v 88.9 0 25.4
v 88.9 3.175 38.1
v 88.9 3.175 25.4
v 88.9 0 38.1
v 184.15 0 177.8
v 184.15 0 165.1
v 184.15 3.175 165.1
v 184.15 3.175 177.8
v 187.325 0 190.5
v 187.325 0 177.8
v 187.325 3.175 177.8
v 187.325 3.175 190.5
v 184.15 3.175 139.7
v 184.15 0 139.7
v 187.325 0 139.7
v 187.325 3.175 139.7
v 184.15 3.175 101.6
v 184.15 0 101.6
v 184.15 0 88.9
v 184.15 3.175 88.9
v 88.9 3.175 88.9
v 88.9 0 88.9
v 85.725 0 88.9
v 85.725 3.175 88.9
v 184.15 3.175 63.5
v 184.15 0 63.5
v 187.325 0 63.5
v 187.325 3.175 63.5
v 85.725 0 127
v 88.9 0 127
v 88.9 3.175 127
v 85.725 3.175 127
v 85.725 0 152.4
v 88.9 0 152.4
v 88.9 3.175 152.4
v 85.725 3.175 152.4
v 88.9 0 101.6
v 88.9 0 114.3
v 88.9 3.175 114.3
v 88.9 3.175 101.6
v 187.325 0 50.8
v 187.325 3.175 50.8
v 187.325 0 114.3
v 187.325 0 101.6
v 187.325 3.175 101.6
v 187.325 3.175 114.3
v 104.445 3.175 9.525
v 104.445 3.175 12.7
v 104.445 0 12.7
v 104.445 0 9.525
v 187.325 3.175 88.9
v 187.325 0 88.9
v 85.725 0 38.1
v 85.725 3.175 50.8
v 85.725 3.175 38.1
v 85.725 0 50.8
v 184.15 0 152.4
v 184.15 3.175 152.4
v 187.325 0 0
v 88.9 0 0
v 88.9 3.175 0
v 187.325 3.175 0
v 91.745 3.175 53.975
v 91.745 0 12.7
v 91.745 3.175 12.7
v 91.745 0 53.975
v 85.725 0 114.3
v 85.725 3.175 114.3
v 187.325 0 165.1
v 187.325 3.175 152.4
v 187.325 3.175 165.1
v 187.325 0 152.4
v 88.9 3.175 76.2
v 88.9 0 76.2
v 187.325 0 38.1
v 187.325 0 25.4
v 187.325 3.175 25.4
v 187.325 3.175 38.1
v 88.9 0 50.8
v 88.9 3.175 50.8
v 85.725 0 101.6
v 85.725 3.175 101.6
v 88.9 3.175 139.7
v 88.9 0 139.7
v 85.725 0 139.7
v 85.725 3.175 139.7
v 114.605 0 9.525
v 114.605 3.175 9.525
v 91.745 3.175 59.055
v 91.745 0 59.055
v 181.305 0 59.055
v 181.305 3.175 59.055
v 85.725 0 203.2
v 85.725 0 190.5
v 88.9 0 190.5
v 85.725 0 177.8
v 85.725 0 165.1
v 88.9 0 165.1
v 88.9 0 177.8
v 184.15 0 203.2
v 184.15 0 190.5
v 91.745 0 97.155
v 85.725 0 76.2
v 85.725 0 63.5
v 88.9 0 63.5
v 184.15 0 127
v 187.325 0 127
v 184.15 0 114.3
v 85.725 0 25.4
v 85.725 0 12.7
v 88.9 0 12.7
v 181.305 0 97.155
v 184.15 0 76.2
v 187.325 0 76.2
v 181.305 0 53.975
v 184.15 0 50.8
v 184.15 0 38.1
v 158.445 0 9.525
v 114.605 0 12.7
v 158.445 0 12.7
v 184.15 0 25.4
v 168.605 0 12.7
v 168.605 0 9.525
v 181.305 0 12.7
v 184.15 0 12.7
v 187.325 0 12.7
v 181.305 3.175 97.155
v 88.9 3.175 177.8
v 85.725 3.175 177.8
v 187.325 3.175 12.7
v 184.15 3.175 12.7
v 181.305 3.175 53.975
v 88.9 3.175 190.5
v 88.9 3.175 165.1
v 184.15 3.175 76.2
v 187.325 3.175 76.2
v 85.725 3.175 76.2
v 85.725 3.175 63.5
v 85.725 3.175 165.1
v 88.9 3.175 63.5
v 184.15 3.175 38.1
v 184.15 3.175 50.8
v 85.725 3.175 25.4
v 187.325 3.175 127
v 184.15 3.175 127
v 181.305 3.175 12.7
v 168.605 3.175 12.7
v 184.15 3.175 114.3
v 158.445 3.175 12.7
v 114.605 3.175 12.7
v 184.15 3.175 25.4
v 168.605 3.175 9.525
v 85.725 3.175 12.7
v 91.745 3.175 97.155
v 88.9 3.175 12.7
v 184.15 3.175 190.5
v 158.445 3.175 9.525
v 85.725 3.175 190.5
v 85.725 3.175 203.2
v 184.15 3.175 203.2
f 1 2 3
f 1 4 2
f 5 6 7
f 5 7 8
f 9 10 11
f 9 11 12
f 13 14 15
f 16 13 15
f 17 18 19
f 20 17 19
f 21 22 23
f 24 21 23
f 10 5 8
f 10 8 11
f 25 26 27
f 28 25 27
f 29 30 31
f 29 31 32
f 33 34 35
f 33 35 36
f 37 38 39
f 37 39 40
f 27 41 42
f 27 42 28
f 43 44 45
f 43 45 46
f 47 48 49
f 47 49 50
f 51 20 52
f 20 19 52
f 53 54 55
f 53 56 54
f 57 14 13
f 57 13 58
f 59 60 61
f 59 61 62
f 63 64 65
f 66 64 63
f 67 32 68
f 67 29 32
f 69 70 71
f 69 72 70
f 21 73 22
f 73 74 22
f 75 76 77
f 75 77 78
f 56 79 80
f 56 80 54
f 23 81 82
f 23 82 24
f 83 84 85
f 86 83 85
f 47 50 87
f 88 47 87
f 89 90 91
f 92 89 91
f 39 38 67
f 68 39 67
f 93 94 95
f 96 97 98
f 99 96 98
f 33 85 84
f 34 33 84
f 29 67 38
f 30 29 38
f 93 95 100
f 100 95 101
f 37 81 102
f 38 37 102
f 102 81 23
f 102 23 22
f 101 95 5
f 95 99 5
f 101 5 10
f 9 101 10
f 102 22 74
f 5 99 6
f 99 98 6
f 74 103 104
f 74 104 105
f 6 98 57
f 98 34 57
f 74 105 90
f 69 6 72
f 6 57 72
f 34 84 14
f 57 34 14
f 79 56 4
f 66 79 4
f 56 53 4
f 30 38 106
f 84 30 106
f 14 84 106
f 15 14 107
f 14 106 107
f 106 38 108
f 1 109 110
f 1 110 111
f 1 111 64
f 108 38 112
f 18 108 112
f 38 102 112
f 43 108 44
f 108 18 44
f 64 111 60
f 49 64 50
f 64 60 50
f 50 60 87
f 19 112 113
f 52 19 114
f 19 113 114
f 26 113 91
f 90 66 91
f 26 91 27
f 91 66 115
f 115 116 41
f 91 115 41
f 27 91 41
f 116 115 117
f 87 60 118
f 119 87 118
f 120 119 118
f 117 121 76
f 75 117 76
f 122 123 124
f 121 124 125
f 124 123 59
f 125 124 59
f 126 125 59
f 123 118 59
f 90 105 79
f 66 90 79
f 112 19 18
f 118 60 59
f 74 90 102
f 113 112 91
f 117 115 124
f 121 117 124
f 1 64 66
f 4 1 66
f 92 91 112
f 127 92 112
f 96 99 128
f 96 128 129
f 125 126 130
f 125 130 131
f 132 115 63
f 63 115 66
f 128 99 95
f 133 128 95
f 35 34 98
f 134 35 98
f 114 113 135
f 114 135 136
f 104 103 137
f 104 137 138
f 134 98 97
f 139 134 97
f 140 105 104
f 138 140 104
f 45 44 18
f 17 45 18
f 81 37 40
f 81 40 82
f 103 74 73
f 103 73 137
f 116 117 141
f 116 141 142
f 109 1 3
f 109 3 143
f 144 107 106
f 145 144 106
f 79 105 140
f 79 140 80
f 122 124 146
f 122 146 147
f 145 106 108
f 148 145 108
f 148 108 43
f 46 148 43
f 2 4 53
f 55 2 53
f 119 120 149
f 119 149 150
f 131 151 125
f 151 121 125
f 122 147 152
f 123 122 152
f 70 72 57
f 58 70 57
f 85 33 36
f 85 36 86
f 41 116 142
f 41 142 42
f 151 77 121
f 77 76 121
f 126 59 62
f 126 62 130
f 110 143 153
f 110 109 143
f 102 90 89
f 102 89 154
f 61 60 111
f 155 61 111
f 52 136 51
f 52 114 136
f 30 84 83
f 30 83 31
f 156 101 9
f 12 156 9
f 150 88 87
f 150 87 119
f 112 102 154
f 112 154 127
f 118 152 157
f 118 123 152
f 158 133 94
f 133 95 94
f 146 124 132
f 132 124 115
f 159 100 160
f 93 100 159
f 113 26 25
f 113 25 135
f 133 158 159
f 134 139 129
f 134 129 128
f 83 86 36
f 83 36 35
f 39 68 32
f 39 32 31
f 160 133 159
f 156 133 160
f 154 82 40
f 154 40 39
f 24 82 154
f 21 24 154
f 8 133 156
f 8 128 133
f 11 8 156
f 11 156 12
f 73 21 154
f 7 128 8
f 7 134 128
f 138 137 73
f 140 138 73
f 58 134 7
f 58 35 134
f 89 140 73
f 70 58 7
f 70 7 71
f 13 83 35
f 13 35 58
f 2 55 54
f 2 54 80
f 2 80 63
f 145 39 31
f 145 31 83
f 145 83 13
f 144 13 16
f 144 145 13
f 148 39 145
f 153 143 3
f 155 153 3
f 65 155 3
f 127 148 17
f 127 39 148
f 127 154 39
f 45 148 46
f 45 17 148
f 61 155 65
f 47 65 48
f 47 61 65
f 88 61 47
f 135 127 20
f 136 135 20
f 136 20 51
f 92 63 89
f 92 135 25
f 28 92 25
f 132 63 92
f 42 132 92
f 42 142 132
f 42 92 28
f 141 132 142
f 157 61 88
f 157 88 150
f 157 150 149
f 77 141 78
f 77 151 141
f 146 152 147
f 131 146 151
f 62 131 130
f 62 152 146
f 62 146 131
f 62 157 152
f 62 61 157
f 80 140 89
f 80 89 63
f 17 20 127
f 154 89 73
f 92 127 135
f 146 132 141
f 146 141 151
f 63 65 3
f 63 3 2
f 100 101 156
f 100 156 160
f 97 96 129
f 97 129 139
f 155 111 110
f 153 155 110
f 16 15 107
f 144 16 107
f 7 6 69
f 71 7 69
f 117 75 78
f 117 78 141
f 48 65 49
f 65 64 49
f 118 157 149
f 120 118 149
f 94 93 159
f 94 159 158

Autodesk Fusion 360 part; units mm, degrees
sketch "Sketch2" plane through (0, 0, 0) normal (0, 0, 1) x (1, 0, 0)
sketch "Sketch3" plane through (0, 0, 0) normal (0, 1, 0) x (1, 0, 0)
  line L0 (85.725, 0) -> (101.6, 0)
  line L1 (88.9, -50.8) -> (85.725, -50.8)
  line L2 (187.325, -12.7) -> (184.15, -12.7)
  line L3 (104.4448, -12.7) -> (104.4448, -9.525)
  line L4 (88.9, -12.7) -> (85.725, -12.7)
  line L5 (85.725, -25.4) -> (85.725, -12.7)
  line L6 (91.7448, -12.7) -> (104.4448, -12.7)
  line L7 (88.9, -63.5) -> (88.9, -50.8)
  line L8 (181.3052, -12.7) -> (168.6052, -12.7)
  line L9 (88.9, -76.2) -> (88.9, -63.5)
  line L10 (181.3052, -53.975) -> (91.7448, -53.975)
  line L11 (85.725, 0) -> (87.3125, 0)
  line L12 (91.7448, 0) -> (91.7448, -12.7)
  line L13 (88.9, -50.8) -> (88.9, -38.1)
  line L14 (88.9, -25.4) -> (88.9, -12.7)
  line L15 (176.2252, 0) -> (181.3052, 0)
  line L16 (187.325, -38.1) -> (184.15, -38.1)
  line L17 (158.4452, -12.7) -> (156.5402, -12.7)
  line L18 (96.8248, -12.7) -> (104.4448, -12.7)
  line L19 (168.6052, -12.7) -> (176.2252, -12.7)
  line L20 (91.7448, -12.7) -> (96.8248, -12.7)
  line L21 (88.9, -38.1) -> (88.9, -25.4)
  line L22 (168.6052, -12.7) -> (168.6052, -9.525)
  line L23 (96.8248, 0) -> (91.7448, 0)
  line L24 (187.325, -25.4) -> (184.15, -25.4)
  line L25 (88.9, -25.4) -> (85.725, -25.4)
  line L26 (114.6048, -12.7) -> (156.5402, -12.7)
  line L27 (158.4452, -9.525) -> (158.4452, -12.7)
  line L28 (114.6048, -9.525) -> (114.6048, -12.7)
  line L29 (187.325, 0) -> (187.325, -12.7)
  line L30 (181.3052, -12.7) -> (176.2252, -12.7)
  line L31 (187.325, 0) -> (184.15, 0)
  line L32 (85.725, 0) -> (96.8248, 0)
  line L33 (187.325, 0) -> (176.2252, 0)
  line L34 (184.15, -12.7) -> (184.15, 0)
  line L35 (184.15, -25.4) -> (184.15, -12.7)
  line L36 (88.9, -139.7) -> (85.725, -139.7)
  line L37 (88.9, -101.6) -> (88.9, -95.25)
  line L38 (88.9, -127) -> (85.725, -127)
  line L39 (88.9, -95.25) -> (88.9, -88.9)
  line L40 (184.15, -101.6) -> (184.15, -88.9)
  line L41 (88.9, -114.3) -> (88.9, -101.6)
  line L42 (187.325, -101.6) -> (187.325, -114.3)
  line L43 (184.15, -127) -> (184.15, -114.3)
  line L44 (88.9, -127) -> (88.9, -114.3)
  line L45 (187.325, -101.6) -> (184.15, -101.6)
  line L46 (187.325, -139.7) -> (187.325, -127)
  line L47 (184.15, -139.7) -> (187.325, -139.7)
  line L48 (88.9, -114.3) -> (85.725, -114.3)
  line L49 (88.9, -139.7) -> (88.9, -127)
  line L50 (187.325, -114.3) -> (187.325, -101.6)
  line L51 (187.325, -127) -> (184.15, -127)
  line L52 (88.9, -88.9) -> (85.725, -88.9)
  line L53 (91.7448, -97.155) -> (181.3052, -97.155)
  line L54 (85.725, -101.6) -> (85.725, -88.9)
  line L55 (88.9, -101.6) -> (85.725, -101.6)
  line L56 (187.325, -127) -> (187.325, -139.7)
  line L57 (184.15, -88.9) -> (187.325, -88.9)
  line L58 (184.15, -114.3) -> (187.325, -114.3)
  line L59 (85.725, -127) -> (85.725, -114.3)
  line L60 (184.15, 0) -> (184.15, -203.2)
  line L61 (85.725, -203.2) -> (88.9, -203.2)
  line L62 (88.9, 0) -> (88.9, -203.2)
  line L63 (88.9, -165.1) -> (88.9, -152.4)
  line L64 (187.325, -152.4) -> (187.325, -165.1)
  line L65 (184.15, -203.2) -> (184.15, -190.5)
  line L66 (184.15, -152.4) -> (184.15, -139.7)
  line L67 (88.9, -203.2) -> (88.9, -190.5)
  line L68 (85.725, -152.4) -> (85.725, -139.7)
  line L69 (88.9, -165.1) -> (85.725, -165.1)
  line L70 (88.9, -190.5) -> (85.725, -190.5)
  line L71 (88.9, -177.8) -> (85.725, -177.8)
  line L72 (184.15, -177.8) -> (187.325, -177.8)
  line L73 (184.15, -190.5) -> (184.15, -177.8)
  line L74 (88.9, -152.4) -> (88.9, -139.7)
  line L75 (184.15, -165.1) -> (187.325, -165.1)
  line L76 (187.325, -177.8) -> (187.325, -190.5)
  line L77 (88.9, -152.4) -> (85.725, -152.4)
  line L78 (187.325, -152.4) -> (184.15, -152.4)
  line L79 (184.15, -190.5) -> (187.325, -190.5)
  line L80 (184.15, -76.2) -> (187.325, -76.2)
  line L81 (181.3052, 0) -> (181.3052, -12.7)
  line L82 (91.7448, -59.055) -> (181.3052, -59.055)
  line L83 (187.325, -165.1) -> (187.325, -152.4)
  line L84 (91.7448, -59.055) -> (91.7448, -97.155)
  line L85 (88.9, -63.5) -> (85.725, -63.5)
  line L86 (184.15, -177.8) -> (184.15, -165.1)
  line L87 (184.15, -50.8) -> (184.15, -38.1)
  line L88 (85.725, 0) -> (187.325, 0)
  line L89 (184.15, -63.5) -> (187.325, -63.5)
  line L90 (187.325, -25.4) -> (187.325, -38.1)
  line L91 (187.325, 0) -> (175.26, 0)
  line L92 (184.15, -76.2) -> (184.15, -63.5)
  line L93 (181.3052, -59.055) -> (181.3052, -97.155)
  line L94 (187.325, -50.8) -> (187.325, -63.5)
  line L95 (168.6052, -9.525) -> (158.4452, -9.525)
  line L96 (184.15, -38.1) -> (184.15, -25.4)
  line L97 (85.725, -76.2) -> (85.725, -63.5)
  line L98 (85.725, -177.8) -> (85.725, -165.1)
  line L99 (91.7448, -12.7) -> (91.7448, -53.975)
  line L100 (85.725, -50.8) -> (85.725, -38.1)
  line L101 (104.4448, -9.525) -> (114.6048, -9.525)
  line L102 (184.15, -50.8) -> (187.325, -50.8)
  line L103 (88.9, -177.8) -> (88.9, -165.1)
  line L104 (181.3052, -12.7) -> (181.3052, -53.975)
  line L105 (187.325, -76.2) -> (187.325, -88.9)
  line L106 (88.9, -190.5) -> (88.9, -177.8)
  line L107 (184.15, -88.9) -> (184.15, -76.2)
  line L108 (184.15, -203.2) -> (85.725, -203.2)
  line L109 (88.9, -76.2) -> (85.725, -76.2)
  line L110 (88.9, -88.9) -> (88.9, -76.2)
  line L111 (88.9, -38.1) -> (85.725, -38.1)
  line L112 (85.725, 0) -> (88.9, 0)
  line L113 (91.7448, -53.975) -> (91.7448, -59.055)
  line L114 (85.725, -203.2) -> (85.725, -190.5)
  line L115 (184.15, -63.5) -> (184.15, -50.8)
  point P0 (187.325, 0)
  dimension "d68" = 11.0998
  dimension "d69" = 11.0998
  dimension "d70" = 12.7
  dimension "d71" = 12.7
  dimension "d72" = 5.08
  dimension "d73" = 5.08
  dimension "d74" = 41.275
  dimension "d75" = 5.08
  dimension "d76" = 5.08
  dimension "d77" = 38.1
  dimension "d78" = 3.175
  dimension "d79" = 3.175
  dimension "d80" = 3.175
  dimension "d81" = 3.175
  dimension "d82" = 12.7
  dimension "d83" = 12.7
  dimension "d84" = 12.7
  dimension "d85" = 12.7
  dimension "d86" = 12.7
  dimension "d87" = 12.7
  dimension "d88" = 12.7
  dimension "d89" = 12.7
  dimension "d90" = 6.35
  dimension "d91" = 6.35
  dimension "d92" = 12.7
  dimension "d93" = 12.7
  dimension "d94" = 12.7
  dimension "d95" = 12.7
  dimension "d96" = 12.7
  dimension "d97" = 12.7
  dimension "d98" = 12.7
  dimension "d99" = 12.7
  dimension "d100" = 3.175
  dimension "d101" = 10.16
  dimension "d102" = 3.175
  dimension "d103" = 10.16
extrude "Extrude1" add sketch "Sketch3" along normal blind 3.175 contours L0 L7 L9 L10 L12 L13 L14 L21 L32 L33 L34 L35 L37 L39 L40 L41 L43 L44 L49 L60 L62 L63 L65 L66 L67 L73 L74 L81 L86 L87 L88 L91 L92 L96 L99 L103 L104 L106 L107 L108 L110 L115 | L0 L3 L6 L8 L12 L15 L17 L18 L19 L20 L22 L23 L26 L27 L28 L30 L32 L33 L81 L88 L91 L95 L101 | L4 L5 L14 L25 L62 | L1 L13 L62 L100 L111 | L9 L62 L85 L97 L109 | L2 L29 L31 L33 L34 L60 L88 L91 | L37 L39 L52 L54 L55 L62 | L16 L24 L60 L90 L96 | L38 L44 L48 L59 L62 | L60 L89 L94 L102 L115 | L36 L62 L68 L74 L77 | L57 L60 L80 L105 L107 | L62 L69 L71 L98 L103 | L42 L45 L50 L58 L60 | L61 L62 L67 L70 L108 L114 | L46 L47 L51 L56 L60 | L60 L64 L75 L78 L83 | L60 L72 L73 L76 L79
sketch "Sketch4" plane through (0, 0, 0) normal (0, -1, 0) x (1, 0, 0)
  line L0 (168.6052, 12.7) -> (168.6052, 9.525)
  line L1 (168.6052, 9.525) -> (158.4452, 9.525)
  line L2 (158.4452, 9.525) -> (158.4452, 12.7)
  line L3 (158.4452, 12.7) -> (156.5402, 12.7)
  line L4 (156.5402, 12.7) -> (114.6048, 12.7)
  line L5 (114.6048, 12.7) -> (114.6048, 9.525)
  line L6 (114.6048, 9.525) -> (104.4448, 9.525)
  line L7 (104.4448, 9.525) -> (104.4448, 12.7)
  line L8 (104.4448, 12.7) -> (96.8248, 12.7)
  line L9 (96.8248, 12.7) -> (91.7448, 12.7)
  line L10 (91.7448, 12.7) -> (91.7448, 53.975)
  line L11 (91.7448, 53.975) -> (181.3052, 53.975)
  line L12 (181.3052, 53.975) -> (181.3052, 12.7)
  line L13 (181.3052, 12.7) -> (176.2252, 12.7)
  line L14 (176.2252, 12.7) -> (168.6052, 12.7)
  line L15 (91.7448, 59.055) -> (91.7448, 97.155)
  line L16 (91.7448, 97.155) -> (181.3052, 97.155)
  line L17 (181.3052, 97.155) -> (181.3052, 59.055)
  line L18 (181.3052, 59.055) -> (91.7448, 59.055)
  line L19 (184.15, 190.5) -> (184.15, 203.2)
  line L20 (184.15, 203.2) -> (85.725, 203.2)
  line L21 (85.725, 203.2) -> (85.725, 190.5)
  line L22 (85.725, 190.5) -> (88.9, 190.5)
  line L23 (88.9, 190.5) -> (88.9, 177.8)
  line L24 (88.9, 177.8) -> (85.725, 177.8)
  line L25 (85.725, 177.8) -> (85.725, 165.1)
  line L26 (85.725, 165.1) -> (88.9, 165.1)
  line L27 (88.9, 165.1) -> (88.9, 152.4)
  line L28 (88.9, 152.4) -> (85.725, 152.4)
  line L29 (85.725, 152.4) -> (85.725, 139.7)
  line L30 (85.725, 139.7) -> (88.9, 139.7)
  line L31 (88.9, 139.7) -> (88.9, 127)
  line L32 (88.9, 127) -> (85.725, 127)
  line L33 (85.725, 127) -> (85.725, 114.3)
  line L34 (85.725, 114.3) -> (88.9, 114.3)
  line L35 (88.9, 114.3) -> (88.9, 101.6)
  line L36 (88.9, 101.6) -> (85.725, 101.6)
  line L37 (85.725, 101.6) -> (85.725, 88.9)
  line L38 (85.725, 88.9) -> (88.9, 88.9)
  line L39 (88.9, 88.9) -> (88.9, 76.2)
  line L40 (88.9, 76.2) -> (85.725, 76.2)
  line L41 (85.725, 76.2) -> (85.725, 63.5)
  line L42 (85.725, 63.5) -> (88.9, 63.5)
  line L43 (88.9, 63.5) -> (88.9, 50.8)
  line L44 (88.9, 50.8) -> (85.725, 50.8)
  line L45 (85.725, 50.8) -> (85.725, 38.1)
  line L46 (85.725, 38.1) -> (88.9, 38.1)
  line L47 (88.9, 38.1) -> (88.9, 25.4)
  line L48 (88.9, 25.4) -> (85.725, 25.4)
  line L49 (85.725, 25.4) -> (85.725, 12.7)
  line L50 (85.725, 12.7) -> (88.9, 12.7)
  line L51 (88.9, 12.7) -> (88.9, 0)
  line L52 (88.9, 0) -> (187.325, 0)
  line L53 (187.325, 0) -> (187.325, 12.7)
  line L54 (187.325, 12.7) -> (184.15, 12.7)
  line L55 (184.15, 12.7) -> (184.15, 25.4)
  line L56 (184.15, 25.4) -> (187.325, 25.4)
  line L57 (187.325, 25.4) -> (187.325, 38.1)
  line L58 (187.325, 38.1) -> (184.15, 38.1)
  line L59 (184.15, 38.1) -> (184.15, 50.8)
  line L60 (184.15, 50.8) -> (187.325, 50.8)
  line L61 (187.325, 50.8) -> (187.325, 63.5)
  line L62 (187.325, 63.5) -> (184.15, 63.5)
  line L63 (184.15, 63.5) -> (184.15, 76.2)
  line L64 (184.15, 76.2) -> (187.325, 76.2)
  line L65 (187.325, 76.2) -> (187.325, 88.9)
  line L66 (187.325, 88.9) -> (184.15, 88.9)
  line L67 (184.15, 88.9) -> (184.15, 101.6)
  line L68 (184.15, 101.6) -> (187.325, 101.6)
  line L69 (187.325, 101.6) -> (187.325, 114.3)
  line L70 (187.325, 114.3) -> (184.15, 114.3)
  line L71 (184.15, 114.3) -> (184.15, 127)
  line L72 (184.15, 127) -> (187.325, 127)
  line L73 (187.325, 127) -> (187.325, 139.7)
  line L74 (187.325, 139.7) -> (184.15, 139.7)
  line L75 (184.15, 139.7) -> (184.15, 152.4)
  line L76 (184.15, 152.4) -> (187.325, 152.4)
  line L77 (187.325, 152.4) -> (187.325, 165.1)
  line L78 (187.325, 165.1) -> (184.15, 165.1)
  line L79 (184.15, 165.1) -> (184.15, 177.8)
  line L80 (184.15, 177.8) -> (187.325, 177.8)
  line L81 (187.325, 177.8) -> (187.325, 190.5)
  line L82 (187.325, 190.5) -> (184.15, 190.5)
  line L83 (88.9, 0) -> (104.14, 0)
  line L84 (168.6052, 9.525) -> (168.6052, 0)
  line L85 (168.6052, 0) -> (187.325, 0)
  line L86 (104.4448, 9.525) -> (104.4448, 0)
equation "d68 = 0.5 in - 0.063 in"
equation "d74 = 1.5 in + 0.125 in"
